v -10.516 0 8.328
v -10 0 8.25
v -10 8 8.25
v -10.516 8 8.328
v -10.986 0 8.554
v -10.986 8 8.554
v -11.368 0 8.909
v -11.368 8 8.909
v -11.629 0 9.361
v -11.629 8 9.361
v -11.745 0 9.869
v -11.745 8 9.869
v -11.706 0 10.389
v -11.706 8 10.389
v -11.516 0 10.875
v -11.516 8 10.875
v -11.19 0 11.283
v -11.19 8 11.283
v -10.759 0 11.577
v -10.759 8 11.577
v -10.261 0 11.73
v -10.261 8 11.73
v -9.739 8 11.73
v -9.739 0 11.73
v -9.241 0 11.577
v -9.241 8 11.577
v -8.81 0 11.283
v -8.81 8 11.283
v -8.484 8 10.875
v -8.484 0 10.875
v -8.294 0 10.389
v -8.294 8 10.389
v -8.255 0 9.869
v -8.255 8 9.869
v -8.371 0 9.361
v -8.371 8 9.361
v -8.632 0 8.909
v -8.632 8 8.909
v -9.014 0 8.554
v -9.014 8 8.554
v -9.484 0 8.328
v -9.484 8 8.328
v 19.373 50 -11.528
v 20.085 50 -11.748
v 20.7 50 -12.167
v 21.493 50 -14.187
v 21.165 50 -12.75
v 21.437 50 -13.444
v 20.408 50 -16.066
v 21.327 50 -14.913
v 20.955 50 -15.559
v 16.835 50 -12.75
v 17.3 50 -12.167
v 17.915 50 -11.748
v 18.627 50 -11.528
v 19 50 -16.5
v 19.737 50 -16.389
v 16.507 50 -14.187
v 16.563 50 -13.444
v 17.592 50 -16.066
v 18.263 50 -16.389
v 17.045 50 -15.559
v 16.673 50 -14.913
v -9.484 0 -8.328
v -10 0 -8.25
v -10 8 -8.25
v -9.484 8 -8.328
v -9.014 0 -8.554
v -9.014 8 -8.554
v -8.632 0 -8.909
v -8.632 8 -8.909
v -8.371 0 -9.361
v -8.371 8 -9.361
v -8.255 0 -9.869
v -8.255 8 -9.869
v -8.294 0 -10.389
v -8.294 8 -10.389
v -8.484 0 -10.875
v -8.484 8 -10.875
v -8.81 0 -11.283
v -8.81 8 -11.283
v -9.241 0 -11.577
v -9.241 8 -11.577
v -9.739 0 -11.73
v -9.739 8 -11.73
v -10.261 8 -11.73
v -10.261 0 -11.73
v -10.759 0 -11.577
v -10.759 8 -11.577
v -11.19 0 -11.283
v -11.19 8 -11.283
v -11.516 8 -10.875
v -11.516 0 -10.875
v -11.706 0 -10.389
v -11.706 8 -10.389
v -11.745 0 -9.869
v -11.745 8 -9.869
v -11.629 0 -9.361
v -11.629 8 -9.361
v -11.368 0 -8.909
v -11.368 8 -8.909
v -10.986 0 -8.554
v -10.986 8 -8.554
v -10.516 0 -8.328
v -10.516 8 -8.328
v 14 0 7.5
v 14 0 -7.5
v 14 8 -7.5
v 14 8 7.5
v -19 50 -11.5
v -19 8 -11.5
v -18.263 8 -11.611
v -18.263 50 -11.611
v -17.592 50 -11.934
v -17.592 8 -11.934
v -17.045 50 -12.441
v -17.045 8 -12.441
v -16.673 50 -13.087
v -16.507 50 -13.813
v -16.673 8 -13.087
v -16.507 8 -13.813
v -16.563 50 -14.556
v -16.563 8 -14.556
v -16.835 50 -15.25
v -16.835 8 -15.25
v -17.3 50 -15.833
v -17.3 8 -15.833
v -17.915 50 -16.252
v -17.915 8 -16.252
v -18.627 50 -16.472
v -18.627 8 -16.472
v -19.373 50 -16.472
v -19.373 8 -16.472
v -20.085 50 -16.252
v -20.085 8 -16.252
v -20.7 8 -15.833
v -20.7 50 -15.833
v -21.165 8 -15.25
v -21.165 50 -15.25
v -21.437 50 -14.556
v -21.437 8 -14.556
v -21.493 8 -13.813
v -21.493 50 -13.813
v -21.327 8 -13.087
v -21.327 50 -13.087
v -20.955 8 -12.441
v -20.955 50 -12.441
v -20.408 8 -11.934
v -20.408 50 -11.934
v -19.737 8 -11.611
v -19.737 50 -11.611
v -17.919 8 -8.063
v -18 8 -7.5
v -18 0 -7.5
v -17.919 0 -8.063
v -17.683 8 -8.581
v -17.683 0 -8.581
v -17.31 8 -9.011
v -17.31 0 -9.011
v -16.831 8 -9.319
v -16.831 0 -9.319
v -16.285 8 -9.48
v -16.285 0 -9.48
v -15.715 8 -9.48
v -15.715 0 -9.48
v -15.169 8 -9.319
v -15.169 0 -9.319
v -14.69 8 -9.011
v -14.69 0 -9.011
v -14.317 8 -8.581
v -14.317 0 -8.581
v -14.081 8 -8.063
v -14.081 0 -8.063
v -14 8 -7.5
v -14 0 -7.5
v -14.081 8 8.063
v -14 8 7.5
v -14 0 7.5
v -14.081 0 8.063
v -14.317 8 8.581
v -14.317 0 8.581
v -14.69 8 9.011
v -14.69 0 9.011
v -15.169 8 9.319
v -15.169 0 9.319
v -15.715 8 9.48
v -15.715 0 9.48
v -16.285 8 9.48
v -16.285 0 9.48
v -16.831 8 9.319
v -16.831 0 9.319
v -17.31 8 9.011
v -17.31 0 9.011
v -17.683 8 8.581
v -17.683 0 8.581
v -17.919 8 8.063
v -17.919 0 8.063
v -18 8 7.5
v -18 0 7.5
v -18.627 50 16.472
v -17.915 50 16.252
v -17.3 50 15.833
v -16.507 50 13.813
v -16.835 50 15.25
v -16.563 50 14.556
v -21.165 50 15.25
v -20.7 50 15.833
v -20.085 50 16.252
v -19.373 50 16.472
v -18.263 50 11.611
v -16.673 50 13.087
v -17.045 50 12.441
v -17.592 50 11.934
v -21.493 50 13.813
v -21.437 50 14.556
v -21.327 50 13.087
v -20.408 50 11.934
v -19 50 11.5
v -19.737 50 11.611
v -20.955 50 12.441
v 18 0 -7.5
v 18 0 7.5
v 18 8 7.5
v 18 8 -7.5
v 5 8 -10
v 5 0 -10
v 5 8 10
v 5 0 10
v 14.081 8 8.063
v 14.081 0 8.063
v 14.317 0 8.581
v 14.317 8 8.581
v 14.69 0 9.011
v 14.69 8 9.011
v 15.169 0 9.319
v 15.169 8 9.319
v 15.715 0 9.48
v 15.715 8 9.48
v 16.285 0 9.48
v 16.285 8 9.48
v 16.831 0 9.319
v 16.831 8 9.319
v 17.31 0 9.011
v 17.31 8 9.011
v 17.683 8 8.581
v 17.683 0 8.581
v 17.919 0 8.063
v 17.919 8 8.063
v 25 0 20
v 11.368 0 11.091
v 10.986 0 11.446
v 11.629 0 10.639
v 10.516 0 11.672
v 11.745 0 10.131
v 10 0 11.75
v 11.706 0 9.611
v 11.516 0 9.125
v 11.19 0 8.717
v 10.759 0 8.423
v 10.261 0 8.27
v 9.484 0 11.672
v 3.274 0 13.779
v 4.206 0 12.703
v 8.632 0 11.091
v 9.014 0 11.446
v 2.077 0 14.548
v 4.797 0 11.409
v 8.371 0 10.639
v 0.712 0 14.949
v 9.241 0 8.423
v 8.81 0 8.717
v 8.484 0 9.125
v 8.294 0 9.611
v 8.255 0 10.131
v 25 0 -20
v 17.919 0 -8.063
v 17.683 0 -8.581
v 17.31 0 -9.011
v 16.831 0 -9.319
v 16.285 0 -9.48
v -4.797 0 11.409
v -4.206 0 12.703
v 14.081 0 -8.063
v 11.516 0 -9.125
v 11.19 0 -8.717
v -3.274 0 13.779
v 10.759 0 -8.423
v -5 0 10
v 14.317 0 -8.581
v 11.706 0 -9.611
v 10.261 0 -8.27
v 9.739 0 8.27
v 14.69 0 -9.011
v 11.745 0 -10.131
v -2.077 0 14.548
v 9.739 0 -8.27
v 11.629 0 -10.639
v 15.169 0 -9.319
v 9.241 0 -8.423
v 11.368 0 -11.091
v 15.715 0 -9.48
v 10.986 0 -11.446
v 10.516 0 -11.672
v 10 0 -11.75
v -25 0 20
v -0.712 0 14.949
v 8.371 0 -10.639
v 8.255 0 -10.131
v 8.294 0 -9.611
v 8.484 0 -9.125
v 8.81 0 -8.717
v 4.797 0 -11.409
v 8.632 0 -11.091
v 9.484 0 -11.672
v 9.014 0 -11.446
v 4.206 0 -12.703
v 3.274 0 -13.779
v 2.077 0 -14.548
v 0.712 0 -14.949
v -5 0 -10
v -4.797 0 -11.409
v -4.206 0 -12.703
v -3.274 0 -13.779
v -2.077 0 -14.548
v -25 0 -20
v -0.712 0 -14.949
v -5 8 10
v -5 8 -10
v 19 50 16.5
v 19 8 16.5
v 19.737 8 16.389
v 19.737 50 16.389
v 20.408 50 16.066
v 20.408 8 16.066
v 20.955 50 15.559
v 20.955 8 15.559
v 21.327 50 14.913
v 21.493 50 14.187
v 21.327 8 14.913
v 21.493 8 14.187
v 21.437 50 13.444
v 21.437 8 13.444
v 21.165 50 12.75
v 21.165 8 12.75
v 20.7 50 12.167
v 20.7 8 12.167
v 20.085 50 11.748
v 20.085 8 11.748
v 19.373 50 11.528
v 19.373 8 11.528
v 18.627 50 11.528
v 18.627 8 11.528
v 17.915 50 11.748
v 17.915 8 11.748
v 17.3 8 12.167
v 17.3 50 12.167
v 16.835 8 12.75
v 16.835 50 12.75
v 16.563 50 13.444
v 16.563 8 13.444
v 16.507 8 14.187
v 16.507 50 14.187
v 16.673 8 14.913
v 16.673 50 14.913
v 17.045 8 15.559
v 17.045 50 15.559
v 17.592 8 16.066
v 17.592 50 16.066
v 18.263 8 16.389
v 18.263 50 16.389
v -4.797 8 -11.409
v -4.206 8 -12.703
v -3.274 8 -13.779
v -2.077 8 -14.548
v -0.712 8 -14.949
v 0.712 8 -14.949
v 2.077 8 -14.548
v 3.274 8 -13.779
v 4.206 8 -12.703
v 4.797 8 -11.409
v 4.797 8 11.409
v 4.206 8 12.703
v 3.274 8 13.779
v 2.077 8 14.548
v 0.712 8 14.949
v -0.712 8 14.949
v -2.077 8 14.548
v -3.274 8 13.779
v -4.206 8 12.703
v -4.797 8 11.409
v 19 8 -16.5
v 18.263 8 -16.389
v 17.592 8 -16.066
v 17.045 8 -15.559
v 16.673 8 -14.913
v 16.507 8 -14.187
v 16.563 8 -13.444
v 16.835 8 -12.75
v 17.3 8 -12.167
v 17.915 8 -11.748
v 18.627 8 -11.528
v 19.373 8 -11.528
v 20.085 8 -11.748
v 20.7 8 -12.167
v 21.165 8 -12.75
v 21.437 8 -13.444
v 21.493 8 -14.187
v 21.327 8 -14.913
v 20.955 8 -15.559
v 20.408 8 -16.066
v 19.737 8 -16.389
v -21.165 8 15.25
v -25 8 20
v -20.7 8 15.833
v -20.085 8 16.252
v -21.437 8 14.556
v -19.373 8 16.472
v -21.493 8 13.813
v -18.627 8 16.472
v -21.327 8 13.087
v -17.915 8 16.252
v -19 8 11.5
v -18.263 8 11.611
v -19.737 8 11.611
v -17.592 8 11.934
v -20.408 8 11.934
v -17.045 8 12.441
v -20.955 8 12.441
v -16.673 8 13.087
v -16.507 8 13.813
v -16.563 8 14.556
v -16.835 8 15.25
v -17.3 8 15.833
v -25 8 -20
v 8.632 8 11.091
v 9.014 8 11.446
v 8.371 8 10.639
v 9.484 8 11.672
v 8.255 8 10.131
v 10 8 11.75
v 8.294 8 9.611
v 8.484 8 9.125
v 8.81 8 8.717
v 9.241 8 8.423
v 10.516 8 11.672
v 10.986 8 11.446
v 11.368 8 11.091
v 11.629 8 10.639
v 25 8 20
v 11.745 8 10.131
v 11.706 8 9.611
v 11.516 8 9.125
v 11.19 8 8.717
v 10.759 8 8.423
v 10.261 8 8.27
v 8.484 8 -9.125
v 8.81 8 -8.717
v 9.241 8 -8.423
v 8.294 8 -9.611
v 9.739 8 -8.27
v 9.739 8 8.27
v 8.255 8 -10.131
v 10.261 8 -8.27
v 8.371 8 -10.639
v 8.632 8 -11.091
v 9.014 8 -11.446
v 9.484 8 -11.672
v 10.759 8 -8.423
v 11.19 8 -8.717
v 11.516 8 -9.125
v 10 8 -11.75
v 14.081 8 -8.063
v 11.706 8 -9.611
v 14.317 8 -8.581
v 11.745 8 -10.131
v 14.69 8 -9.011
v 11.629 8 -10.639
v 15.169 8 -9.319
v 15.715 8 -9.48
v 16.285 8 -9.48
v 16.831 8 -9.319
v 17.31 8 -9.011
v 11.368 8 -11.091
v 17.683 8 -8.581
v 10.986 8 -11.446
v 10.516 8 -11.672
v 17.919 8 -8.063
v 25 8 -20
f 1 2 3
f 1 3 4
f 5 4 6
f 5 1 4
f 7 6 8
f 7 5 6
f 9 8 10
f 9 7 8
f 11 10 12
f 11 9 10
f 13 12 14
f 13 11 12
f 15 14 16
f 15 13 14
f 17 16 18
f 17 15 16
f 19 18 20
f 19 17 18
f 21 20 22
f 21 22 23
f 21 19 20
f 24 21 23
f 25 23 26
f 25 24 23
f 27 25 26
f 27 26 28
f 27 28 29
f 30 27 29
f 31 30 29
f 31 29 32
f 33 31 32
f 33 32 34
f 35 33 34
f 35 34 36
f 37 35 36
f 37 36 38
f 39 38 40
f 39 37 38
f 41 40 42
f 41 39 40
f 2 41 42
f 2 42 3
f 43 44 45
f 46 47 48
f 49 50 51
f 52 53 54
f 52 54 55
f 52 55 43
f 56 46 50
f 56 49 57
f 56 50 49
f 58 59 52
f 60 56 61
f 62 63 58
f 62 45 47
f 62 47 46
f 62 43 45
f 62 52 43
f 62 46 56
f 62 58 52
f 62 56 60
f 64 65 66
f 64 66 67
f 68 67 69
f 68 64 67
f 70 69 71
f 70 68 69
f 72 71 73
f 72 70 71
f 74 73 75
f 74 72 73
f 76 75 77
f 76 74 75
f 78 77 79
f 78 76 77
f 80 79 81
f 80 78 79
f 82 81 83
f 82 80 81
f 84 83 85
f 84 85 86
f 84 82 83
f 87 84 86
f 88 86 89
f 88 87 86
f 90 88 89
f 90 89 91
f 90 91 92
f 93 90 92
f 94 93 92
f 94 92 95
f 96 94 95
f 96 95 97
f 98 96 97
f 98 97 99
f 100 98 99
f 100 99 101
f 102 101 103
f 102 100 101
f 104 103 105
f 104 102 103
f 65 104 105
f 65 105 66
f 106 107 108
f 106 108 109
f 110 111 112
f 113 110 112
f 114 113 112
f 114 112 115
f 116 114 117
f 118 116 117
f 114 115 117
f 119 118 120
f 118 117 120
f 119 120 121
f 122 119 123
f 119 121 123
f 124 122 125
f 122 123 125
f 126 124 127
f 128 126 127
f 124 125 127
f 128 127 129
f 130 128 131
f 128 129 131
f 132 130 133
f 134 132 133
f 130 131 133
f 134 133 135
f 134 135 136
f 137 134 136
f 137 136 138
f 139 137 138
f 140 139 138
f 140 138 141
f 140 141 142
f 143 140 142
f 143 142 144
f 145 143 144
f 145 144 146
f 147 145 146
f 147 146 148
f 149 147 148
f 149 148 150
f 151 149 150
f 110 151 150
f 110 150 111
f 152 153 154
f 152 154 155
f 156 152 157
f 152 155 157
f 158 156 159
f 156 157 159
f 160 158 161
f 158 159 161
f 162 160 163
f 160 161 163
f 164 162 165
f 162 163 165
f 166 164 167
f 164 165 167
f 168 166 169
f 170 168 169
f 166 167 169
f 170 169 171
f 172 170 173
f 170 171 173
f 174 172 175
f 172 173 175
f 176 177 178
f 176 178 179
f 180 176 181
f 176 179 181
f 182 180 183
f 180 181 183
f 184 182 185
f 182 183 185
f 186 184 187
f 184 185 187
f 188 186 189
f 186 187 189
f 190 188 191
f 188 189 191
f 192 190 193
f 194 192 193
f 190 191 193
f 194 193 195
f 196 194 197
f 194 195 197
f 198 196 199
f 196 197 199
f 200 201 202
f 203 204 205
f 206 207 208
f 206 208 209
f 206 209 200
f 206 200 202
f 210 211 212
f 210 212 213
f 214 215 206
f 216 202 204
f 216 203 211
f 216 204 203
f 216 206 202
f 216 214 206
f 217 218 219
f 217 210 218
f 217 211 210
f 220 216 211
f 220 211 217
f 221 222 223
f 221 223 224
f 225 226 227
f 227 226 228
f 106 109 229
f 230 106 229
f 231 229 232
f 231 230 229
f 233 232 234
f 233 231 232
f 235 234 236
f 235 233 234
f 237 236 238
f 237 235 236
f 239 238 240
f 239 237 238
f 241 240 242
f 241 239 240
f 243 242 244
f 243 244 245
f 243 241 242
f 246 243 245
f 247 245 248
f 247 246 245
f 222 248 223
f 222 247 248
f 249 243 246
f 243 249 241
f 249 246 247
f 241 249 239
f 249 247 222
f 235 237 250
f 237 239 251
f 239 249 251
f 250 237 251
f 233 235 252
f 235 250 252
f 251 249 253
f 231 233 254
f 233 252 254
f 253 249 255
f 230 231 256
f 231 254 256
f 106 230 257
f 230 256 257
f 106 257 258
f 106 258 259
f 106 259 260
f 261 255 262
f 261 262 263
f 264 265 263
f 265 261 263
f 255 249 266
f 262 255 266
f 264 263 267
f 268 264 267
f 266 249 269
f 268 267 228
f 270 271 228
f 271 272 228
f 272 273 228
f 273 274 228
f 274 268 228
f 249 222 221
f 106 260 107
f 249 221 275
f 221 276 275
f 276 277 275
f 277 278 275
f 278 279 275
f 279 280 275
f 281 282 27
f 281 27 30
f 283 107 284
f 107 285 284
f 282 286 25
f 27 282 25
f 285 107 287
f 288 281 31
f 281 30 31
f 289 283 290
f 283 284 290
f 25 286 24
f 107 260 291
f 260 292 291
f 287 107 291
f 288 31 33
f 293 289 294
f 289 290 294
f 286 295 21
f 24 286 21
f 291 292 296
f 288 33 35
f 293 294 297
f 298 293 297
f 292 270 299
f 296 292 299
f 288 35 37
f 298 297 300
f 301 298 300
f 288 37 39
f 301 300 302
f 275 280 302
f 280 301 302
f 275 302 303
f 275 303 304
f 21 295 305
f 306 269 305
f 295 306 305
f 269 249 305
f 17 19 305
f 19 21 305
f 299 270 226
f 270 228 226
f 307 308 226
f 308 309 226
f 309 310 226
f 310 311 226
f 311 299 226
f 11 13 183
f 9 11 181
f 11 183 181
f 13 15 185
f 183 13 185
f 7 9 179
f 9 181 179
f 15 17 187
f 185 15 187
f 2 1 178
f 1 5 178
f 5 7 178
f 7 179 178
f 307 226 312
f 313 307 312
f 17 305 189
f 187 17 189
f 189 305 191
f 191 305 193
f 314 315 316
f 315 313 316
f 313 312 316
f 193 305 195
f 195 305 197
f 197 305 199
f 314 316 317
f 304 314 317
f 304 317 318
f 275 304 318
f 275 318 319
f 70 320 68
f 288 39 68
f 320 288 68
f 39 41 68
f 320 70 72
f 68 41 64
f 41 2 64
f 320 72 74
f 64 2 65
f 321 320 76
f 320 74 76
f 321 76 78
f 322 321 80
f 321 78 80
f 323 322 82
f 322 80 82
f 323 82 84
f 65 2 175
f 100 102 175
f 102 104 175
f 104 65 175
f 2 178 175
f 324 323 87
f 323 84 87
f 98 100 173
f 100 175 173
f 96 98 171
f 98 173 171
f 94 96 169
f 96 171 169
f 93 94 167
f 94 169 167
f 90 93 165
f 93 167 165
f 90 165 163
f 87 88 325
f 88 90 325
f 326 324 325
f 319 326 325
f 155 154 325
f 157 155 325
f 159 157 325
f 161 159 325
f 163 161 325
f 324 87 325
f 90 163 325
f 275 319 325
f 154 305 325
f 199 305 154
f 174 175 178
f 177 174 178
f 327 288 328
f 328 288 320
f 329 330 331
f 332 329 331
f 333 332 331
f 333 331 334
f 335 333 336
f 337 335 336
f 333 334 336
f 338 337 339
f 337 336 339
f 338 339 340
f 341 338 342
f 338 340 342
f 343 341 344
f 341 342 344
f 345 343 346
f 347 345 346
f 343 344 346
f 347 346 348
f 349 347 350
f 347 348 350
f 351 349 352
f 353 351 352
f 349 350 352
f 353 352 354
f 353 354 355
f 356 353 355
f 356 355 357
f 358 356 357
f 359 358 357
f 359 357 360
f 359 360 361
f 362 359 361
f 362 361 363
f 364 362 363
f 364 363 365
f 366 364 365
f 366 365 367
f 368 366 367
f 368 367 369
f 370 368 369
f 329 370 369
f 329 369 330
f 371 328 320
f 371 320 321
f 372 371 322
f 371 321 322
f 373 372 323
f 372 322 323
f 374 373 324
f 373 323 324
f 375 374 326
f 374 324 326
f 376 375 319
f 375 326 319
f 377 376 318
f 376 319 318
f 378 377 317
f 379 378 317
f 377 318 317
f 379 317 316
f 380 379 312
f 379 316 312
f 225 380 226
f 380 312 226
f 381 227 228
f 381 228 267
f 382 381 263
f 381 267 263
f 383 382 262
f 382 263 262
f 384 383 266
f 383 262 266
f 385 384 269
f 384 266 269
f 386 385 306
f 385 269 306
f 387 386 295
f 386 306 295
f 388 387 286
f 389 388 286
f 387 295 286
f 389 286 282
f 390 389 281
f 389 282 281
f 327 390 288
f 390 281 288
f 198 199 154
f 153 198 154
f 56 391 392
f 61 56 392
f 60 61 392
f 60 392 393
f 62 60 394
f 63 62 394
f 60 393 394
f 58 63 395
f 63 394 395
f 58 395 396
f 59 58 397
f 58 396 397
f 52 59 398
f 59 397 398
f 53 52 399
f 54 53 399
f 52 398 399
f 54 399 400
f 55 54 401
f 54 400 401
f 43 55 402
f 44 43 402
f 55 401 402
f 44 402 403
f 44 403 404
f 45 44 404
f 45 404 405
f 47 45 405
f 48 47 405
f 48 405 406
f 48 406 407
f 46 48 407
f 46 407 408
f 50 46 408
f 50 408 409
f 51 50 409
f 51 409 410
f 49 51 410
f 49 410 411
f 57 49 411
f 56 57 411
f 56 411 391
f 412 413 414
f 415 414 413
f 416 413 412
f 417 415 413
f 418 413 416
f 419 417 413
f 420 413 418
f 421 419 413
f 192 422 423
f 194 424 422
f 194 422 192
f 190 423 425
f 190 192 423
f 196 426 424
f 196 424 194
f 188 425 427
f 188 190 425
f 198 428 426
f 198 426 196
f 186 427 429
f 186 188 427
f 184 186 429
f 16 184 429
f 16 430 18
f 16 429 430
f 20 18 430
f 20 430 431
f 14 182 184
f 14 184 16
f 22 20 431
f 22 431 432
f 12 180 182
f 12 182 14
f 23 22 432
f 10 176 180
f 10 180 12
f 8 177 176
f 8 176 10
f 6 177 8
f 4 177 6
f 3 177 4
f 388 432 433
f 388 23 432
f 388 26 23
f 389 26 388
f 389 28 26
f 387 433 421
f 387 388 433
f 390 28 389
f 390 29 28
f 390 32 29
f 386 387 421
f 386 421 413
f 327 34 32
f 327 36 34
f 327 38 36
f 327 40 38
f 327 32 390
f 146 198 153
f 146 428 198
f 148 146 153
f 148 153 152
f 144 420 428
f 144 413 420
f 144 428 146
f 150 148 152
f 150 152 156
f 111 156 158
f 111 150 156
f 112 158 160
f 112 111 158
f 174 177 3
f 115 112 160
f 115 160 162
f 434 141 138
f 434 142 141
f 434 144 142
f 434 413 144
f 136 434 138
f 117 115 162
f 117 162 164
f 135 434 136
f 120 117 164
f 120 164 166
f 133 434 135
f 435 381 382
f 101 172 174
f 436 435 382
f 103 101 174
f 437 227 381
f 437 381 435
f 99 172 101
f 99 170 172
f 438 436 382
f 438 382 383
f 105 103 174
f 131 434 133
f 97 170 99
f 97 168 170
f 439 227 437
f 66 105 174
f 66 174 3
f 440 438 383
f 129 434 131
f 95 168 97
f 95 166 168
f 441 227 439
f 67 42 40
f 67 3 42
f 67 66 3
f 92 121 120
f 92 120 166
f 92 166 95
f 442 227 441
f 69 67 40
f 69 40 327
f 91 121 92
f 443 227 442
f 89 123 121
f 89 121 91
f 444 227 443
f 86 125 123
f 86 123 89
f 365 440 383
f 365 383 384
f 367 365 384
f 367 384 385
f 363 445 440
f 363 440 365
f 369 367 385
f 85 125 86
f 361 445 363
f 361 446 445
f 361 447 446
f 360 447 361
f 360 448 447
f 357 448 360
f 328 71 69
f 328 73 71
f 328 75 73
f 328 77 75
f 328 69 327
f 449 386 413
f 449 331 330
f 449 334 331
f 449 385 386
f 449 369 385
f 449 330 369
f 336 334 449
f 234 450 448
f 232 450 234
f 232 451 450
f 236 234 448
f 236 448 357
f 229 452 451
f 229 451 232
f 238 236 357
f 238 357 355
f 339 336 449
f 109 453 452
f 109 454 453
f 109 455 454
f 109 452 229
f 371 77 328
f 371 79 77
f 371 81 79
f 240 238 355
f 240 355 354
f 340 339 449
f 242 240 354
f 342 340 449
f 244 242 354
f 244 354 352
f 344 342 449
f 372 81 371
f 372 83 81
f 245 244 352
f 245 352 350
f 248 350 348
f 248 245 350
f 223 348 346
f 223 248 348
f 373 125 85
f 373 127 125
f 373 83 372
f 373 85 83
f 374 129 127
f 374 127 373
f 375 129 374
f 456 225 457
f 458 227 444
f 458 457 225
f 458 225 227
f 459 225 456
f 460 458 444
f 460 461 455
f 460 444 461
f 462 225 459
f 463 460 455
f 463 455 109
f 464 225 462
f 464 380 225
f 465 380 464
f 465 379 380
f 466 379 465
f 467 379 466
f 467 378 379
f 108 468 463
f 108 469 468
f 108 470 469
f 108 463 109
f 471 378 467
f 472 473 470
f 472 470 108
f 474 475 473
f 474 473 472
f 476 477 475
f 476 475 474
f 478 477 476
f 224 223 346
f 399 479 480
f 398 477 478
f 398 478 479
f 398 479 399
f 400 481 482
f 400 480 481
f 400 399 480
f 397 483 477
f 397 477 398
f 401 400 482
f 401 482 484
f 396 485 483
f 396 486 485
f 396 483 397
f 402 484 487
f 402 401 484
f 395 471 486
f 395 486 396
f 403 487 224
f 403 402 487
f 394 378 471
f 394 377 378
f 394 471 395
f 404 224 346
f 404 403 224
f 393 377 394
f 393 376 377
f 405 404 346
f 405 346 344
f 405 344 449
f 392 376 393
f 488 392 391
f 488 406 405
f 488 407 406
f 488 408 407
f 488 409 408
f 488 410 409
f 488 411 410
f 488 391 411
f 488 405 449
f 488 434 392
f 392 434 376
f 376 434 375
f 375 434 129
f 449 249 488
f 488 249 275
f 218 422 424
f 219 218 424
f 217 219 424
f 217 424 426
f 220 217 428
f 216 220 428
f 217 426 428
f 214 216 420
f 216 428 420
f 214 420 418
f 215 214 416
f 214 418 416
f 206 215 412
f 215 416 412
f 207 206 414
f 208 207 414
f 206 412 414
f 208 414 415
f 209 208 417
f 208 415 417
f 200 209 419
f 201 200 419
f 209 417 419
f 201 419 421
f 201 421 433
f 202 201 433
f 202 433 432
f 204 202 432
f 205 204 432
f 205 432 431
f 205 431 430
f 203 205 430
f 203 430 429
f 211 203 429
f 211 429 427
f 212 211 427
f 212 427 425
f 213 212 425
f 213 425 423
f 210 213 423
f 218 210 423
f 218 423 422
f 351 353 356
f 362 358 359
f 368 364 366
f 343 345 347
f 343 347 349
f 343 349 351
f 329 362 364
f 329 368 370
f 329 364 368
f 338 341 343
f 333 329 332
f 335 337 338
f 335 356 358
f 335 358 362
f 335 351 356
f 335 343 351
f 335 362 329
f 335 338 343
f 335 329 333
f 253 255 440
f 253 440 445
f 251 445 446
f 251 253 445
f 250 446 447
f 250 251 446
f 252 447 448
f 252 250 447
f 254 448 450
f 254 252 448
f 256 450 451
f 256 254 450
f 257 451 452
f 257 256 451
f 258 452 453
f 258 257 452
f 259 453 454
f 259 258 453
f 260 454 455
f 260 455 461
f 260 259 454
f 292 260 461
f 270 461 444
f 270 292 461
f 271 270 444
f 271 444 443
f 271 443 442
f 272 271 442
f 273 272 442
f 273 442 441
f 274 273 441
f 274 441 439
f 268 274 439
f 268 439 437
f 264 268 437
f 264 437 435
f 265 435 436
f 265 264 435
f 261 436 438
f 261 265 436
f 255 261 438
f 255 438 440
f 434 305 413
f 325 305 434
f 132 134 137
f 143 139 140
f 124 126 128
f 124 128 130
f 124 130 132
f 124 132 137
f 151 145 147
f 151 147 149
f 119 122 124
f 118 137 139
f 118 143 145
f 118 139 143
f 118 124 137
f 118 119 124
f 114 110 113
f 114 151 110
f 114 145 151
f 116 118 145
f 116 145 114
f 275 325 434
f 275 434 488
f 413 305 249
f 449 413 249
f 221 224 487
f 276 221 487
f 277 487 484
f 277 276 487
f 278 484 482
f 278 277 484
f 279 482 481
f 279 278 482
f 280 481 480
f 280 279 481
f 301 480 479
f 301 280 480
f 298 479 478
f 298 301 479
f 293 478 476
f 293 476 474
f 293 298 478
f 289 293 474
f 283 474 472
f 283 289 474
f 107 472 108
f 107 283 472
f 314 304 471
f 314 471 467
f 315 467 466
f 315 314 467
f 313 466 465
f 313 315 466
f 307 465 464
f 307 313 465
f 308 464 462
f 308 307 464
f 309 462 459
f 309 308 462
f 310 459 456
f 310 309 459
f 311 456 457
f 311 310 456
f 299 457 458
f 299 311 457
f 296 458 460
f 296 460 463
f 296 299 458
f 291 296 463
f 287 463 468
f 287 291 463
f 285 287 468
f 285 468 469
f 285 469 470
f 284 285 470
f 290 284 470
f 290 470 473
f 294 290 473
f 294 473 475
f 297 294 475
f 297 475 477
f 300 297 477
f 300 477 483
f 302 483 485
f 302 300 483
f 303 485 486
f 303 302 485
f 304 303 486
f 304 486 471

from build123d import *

# Parameters (mm, degrees)
SKETCH1_W            = 50
SKETCH1_H            = 40
SKETCH1_R            = 2.5
SKETCH1_R_2          = 1.75
MAIN_STRUCTURE_DEPTH = 8
SKETCH1_3_R          = 2.5
BOSS_EXTRUDE2_DEPTH  = 3
SKETCH1_4_R          = 2.5
SHAFTS_DEPTH         = 50


with BuildPart() as part:
    # Sketch1 → Main Structure (new body)
    with BuildSketch(Plane(origin=(0, 0, 0), x_dir=(1, 0, 0), z_dir=(0, 1, 0))):
        Rectangle(SKETCH1_W, SKETCH1_H)
        with Locations((-19, 14)):
            Circle(SKETCH1_R, mode=Mode.SUBTRACT)
        with Locations((-19, -14)):
            Circle(SKETCH1_R, mode=Mode.SUBTRACT)
        with Locations((19, 14)):
            Circle(SKETCH1_R, mode=Mode.SUBTRACT)
        with Locations((19, -14)):
            Circle(SKETCH1_R, mode=Mode.SUBTRACT)
        with Locations((-10, 10)):
            Circle(SKETCH1_R_2, mode=Mode.SUBTRACT)
        with Locations((-10, -10)):
            Circle(SKETCH1_R_2, mode=Mode.SUBTRACT)
        with Locations((10, -10)):
            Circle(SKETCH1_R_2, mode=Mode.SUBTRACT)
        with Locations((10, 10)):
            Circle(SKETCH1_R_2, mode=Mode.SUBTRACT)
        with BuildLine():
            Line((-14, 7.5), (-14, -7.5))
            ThreePointArc((-14, -7.5), (-16, -9.5), (-18, -7.5))
            Line((-18, -7.5), (-18, 7.5))
            ThreePointArc((-18, 7.5), (-16, 9.5), (-14, 7.5))
        make_face(mode=Mode.SUBTRACT)
        with BuildLine():
            Line((14, 7.5), (14, -7.5))
            ThreePointArc((14, -7.5), (16, -9.5), (18, -7.5))
            Line((18, -7.5), (18, 7.5))
            ThreePointArc((18, 7.5), (16, 9.5), (14, 7.5))
        make_face(mode=Mode.SUBTRACT)
        with BuildLine():
            Line((5, 10), (5, -10))
            ThreePointArc((5, -10), (0, -15), (-5, -10))
            Line((-5, -10), (-5, 10))
            ThreePointArc((-5, 10), (0, 15), (5, 10))
        make_face(mode=Mode.SUBTRACT)
    extrude(amount=MAIN_STRUCTURE_DEPTH)

    # Sketch1<3> → Boss-Extrude2 (add)
    with BuildSketch(Plane(origin=(0, 0, 0), x_dir=(1, 0, 0), z_dir=(0, 1, 0))):
        with Locations((-19, 14)):
            Circle(SKETCH1_3_R)
        with Locations((-19, -14)):
            Circle(SKETCH1_3_R)
        with Locations((19, 14)):
            Circle(SKETCH1_3_R)
        with Locations((19, -14)):
            Circle(SKETCH1_3_R)
    extrude(amount=BOSS_EXTRUDE2_DEPTH)

    # Sketch1<4> → Shafts (add)
    with BuildSketch(Plane(origin=(0, 0, 0), x_dir=(1, 0, 0), z_dir=(0, 1, 0))):
        with Locations((-19, 14)):
            Circle(SKETCH1_4_R)
        with Locations((-19, -14)):
            Circle(SKETCH1_4_R)
        with Locations((19, 14)):
            Circle(SKETCH1_4_R)
        with Locations((19, -14)):
            Circle(SKETCH1_4_R)
    extrude(amount=SHAFTS_DEPTH)


solid = part.part
